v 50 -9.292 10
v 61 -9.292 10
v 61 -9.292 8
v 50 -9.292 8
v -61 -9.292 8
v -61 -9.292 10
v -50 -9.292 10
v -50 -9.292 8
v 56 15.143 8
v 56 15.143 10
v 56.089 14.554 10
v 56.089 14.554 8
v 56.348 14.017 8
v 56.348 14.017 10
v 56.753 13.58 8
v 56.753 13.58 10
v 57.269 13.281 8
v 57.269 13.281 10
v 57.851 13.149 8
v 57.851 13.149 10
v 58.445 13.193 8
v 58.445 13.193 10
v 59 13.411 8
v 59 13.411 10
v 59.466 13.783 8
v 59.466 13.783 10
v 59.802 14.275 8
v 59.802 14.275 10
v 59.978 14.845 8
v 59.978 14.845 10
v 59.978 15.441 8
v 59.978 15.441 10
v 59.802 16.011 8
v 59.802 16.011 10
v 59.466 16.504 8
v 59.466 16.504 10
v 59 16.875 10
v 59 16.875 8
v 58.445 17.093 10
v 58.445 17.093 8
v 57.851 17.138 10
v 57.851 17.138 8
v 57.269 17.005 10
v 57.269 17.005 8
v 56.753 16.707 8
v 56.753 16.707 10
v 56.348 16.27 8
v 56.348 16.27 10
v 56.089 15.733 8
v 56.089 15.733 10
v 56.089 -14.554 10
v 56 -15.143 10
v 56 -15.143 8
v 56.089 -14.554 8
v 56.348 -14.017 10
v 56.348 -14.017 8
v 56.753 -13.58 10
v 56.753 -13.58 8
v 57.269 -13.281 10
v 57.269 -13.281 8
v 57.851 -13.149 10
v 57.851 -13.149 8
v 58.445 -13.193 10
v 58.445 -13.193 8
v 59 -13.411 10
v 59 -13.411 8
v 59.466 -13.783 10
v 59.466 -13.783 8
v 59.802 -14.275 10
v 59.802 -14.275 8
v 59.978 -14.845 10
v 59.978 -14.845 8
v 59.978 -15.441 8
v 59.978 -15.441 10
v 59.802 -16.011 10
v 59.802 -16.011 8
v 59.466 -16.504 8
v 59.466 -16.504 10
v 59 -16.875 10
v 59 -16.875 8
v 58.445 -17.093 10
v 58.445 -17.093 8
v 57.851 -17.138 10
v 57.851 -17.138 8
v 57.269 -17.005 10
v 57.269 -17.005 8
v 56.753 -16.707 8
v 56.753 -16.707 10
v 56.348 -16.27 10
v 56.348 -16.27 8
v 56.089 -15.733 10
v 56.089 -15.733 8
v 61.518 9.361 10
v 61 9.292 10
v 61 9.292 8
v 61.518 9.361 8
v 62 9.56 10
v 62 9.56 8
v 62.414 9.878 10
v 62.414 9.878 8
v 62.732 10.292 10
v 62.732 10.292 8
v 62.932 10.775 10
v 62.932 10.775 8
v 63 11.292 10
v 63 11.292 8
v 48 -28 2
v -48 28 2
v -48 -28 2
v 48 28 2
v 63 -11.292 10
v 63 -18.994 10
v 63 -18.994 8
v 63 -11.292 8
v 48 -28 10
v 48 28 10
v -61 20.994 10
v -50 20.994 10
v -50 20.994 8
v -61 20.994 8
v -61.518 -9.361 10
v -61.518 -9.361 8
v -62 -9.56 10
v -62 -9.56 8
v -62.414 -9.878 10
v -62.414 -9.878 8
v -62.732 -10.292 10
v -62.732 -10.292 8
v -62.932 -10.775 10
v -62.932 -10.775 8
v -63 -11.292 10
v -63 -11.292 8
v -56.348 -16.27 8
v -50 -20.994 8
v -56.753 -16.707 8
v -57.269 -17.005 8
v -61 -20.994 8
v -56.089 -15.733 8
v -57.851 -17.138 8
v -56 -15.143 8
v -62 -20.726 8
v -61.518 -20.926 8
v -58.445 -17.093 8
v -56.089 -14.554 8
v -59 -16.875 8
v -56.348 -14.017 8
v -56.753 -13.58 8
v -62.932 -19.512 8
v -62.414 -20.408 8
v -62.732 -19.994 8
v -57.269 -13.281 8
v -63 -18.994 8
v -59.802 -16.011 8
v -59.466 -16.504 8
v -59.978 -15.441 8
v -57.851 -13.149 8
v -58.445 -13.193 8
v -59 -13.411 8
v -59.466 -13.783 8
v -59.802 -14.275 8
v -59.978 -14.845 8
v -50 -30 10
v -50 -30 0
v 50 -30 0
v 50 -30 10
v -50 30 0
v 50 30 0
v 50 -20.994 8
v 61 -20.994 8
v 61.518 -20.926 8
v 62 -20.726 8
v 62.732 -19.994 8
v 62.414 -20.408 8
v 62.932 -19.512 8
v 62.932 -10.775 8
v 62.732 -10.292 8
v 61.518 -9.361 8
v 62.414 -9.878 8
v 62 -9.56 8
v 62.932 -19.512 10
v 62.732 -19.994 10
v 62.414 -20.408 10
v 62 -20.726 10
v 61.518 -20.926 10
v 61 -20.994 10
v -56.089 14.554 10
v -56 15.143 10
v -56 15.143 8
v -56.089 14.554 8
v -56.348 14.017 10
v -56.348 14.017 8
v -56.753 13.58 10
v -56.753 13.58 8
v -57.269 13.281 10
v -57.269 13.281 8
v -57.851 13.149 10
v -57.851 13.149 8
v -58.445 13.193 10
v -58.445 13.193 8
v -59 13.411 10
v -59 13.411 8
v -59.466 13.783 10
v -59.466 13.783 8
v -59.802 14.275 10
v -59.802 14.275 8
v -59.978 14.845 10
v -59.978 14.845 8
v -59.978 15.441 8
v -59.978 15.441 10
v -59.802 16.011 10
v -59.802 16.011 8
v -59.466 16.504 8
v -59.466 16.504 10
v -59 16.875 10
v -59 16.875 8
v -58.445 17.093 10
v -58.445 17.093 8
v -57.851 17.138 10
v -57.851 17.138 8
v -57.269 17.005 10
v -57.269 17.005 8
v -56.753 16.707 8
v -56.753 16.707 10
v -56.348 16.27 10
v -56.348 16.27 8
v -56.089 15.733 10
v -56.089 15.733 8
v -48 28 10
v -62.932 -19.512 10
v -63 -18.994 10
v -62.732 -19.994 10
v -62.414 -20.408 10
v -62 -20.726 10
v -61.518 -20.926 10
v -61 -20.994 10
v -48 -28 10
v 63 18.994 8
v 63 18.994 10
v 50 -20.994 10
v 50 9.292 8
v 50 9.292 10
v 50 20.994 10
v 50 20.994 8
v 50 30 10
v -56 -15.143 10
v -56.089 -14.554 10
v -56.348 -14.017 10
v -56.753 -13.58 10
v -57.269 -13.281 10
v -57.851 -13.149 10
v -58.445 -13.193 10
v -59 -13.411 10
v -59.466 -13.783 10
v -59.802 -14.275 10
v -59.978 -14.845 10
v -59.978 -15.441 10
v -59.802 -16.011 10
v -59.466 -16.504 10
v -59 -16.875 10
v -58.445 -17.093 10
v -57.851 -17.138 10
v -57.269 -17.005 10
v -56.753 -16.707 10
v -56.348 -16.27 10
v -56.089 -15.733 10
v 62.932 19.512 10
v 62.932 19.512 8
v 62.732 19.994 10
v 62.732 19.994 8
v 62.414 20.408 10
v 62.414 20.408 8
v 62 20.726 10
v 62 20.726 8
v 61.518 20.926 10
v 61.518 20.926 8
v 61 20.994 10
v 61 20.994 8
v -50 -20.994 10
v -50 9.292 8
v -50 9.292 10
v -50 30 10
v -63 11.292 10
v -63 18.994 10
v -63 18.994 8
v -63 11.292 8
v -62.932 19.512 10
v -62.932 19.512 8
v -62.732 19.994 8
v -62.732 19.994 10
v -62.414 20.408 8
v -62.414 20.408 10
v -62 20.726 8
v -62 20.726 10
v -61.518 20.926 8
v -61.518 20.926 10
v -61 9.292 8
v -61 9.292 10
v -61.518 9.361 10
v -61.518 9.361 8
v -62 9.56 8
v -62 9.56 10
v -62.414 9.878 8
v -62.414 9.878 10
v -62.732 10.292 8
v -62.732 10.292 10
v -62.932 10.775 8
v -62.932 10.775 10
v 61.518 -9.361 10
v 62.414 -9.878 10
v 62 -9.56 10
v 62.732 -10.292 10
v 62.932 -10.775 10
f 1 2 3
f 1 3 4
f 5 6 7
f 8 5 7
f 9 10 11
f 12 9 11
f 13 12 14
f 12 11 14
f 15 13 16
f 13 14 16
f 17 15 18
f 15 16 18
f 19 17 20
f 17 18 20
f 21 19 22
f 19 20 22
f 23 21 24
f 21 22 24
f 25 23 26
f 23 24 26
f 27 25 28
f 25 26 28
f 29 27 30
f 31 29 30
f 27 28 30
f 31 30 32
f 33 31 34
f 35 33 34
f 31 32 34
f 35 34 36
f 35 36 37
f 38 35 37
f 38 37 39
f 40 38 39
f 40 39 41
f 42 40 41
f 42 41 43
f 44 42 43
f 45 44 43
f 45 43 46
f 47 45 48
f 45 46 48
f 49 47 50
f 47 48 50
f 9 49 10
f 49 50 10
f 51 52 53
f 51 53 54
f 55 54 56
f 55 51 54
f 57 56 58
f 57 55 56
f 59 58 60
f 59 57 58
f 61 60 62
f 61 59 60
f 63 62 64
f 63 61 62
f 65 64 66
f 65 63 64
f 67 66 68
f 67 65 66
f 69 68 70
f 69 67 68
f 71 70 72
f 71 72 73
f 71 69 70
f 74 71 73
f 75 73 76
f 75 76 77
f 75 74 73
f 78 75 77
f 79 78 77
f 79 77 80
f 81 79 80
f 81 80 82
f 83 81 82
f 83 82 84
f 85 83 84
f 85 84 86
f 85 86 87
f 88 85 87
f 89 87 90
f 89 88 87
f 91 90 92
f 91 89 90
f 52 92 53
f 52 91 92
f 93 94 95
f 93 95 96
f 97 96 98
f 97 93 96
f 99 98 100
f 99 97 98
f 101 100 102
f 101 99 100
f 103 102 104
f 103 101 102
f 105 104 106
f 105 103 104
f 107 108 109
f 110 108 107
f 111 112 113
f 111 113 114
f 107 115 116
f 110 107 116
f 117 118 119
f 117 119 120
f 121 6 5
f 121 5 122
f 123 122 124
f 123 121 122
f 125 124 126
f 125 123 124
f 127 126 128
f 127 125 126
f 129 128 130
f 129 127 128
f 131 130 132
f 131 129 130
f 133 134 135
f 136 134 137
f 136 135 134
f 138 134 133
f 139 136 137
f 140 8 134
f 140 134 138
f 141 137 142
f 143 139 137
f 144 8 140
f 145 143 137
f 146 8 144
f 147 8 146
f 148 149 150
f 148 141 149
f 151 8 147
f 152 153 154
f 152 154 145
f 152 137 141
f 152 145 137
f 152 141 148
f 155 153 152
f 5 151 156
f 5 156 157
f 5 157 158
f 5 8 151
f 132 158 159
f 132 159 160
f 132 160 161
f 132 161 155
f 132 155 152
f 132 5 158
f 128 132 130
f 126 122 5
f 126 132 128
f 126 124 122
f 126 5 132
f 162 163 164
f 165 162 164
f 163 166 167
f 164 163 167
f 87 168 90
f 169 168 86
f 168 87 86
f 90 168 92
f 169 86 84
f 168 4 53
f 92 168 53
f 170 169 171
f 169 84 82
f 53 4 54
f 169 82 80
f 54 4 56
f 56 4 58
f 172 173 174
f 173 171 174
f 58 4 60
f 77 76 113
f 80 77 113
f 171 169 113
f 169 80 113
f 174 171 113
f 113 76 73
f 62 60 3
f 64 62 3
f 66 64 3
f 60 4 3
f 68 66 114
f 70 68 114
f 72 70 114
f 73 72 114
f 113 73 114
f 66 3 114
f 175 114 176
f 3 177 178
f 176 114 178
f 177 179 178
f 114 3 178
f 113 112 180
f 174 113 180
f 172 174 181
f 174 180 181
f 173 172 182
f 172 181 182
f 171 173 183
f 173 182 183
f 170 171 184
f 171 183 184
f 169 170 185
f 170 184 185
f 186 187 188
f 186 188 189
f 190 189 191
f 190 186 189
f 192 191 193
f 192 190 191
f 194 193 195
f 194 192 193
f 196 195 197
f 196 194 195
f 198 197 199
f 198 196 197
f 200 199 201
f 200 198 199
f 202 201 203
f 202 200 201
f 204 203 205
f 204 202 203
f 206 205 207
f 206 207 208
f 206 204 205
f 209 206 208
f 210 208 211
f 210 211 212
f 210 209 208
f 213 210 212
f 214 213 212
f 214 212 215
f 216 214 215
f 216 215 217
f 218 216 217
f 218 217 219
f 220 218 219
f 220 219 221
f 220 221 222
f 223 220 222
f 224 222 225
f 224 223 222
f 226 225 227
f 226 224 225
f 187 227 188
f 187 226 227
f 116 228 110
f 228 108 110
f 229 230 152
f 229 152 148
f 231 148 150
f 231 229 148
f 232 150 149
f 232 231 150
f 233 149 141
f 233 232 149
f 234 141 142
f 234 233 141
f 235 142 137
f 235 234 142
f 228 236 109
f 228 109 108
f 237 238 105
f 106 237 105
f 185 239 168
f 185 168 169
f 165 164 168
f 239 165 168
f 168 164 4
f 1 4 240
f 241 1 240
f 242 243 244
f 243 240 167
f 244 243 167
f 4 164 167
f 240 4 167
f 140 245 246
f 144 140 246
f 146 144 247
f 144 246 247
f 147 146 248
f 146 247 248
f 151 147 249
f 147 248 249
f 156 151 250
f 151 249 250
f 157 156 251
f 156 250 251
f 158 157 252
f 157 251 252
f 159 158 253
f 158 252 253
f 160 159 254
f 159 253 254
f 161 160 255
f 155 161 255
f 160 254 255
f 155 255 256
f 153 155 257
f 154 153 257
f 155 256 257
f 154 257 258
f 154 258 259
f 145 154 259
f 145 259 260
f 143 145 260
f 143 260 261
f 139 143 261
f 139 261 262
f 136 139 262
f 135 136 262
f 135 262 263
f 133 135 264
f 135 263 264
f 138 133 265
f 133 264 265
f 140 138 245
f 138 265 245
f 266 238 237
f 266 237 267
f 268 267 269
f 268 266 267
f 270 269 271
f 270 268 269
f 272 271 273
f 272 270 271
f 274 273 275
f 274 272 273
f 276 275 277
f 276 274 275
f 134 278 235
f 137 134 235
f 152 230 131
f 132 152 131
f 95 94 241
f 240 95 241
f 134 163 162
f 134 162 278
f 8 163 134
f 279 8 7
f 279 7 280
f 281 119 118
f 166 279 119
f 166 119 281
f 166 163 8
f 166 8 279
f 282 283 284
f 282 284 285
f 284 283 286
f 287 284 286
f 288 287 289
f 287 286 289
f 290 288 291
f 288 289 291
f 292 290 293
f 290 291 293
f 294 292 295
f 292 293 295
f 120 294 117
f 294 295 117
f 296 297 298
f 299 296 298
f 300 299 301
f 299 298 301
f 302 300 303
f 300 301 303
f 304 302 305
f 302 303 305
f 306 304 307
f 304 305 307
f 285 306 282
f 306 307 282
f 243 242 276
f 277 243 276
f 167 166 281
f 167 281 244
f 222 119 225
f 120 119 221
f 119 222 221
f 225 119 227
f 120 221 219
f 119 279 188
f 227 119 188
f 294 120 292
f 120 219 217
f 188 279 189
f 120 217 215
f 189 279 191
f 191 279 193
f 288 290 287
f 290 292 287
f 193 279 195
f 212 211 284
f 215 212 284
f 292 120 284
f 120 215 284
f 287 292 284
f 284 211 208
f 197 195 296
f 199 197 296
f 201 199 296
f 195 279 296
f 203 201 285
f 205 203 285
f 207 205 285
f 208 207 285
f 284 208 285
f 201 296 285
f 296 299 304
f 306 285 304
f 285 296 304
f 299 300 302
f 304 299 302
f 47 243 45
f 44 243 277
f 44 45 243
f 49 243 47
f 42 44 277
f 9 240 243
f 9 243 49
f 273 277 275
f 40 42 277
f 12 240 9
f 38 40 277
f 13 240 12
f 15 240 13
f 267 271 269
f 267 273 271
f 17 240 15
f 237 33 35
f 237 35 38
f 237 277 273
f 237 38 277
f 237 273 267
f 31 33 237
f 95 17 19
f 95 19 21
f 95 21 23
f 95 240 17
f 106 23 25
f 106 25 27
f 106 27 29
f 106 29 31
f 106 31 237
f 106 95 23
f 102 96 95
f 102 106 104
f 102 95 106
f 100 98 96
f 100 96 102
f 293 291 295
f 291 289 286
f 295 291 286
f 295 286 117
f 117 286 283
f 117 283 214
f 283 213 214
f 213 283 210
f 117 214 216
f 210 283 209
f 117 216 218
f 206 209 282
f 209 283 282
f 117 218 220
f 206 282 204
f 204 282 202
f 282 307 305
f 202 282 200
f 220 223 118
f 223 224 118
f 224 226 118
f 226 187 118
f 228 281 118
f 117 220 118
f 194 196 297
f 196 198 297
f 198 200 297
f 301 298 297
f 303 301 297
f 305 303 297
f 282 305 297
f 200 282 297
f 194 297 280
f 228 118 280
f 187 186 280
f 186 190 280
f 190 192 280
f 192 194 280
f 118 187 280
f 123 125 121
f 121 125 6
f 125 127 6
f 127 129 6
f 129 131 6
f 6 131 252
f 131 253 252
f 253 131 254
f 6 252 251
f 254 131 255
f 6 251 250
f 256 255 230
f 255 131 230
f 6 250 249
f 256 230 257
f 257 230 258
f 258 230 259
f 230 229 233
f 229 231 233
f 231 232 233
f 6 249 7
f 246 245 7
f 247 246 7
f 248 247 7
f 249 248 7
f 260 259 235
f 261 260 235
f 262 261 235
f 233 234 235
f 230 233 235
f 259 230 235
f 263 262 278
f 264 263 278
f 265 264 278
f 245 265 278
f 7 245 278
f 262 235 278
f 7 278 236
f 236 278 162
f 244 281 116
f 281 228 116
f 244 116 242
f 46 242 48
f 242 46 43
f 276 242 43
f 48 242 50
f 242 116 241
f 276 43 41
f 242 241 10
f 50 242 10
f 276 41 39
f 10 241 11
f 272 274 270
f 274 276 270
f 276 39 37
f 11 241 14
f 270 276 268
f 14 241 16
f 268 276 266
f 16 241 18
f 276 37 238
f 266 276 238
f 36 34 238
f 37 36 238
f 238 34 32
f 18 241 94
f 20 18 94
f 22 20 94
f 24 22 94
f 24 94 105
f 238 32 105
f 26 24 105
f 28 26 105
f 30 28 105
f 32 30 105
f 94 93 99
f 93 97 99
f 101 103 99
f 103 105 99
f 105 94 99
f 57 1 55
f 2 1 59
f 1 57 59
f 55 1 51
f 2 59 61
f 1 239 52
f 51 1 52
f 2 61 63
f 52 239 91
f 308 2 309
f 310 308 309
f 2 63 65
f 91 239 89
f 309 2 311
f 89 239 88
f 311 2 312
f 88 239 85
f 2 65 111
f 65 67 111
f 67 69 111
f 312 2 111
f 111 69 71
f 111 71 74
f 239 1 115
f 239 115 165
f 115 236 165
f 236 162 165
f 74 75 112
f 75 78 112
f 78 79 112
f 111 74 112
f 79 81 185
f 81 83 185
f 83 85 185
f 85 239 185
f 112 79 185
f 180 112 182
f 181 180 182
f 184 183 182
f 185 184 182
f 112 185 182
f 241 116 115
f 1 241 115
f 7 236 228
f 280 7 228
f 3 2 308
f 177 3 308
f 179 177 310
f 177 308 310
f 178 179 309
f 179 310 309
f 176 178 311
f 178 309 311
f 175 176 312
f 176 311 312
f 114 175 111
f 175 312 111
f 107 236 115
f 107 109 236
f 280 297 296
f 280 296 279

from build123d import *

# Parameters (mm, degrees)
SKETCH_W                = 100
SKETCH_H                = 60
PAD_DEPTH               = 10
THICKNESS_T             = -2
SKETCH001_R             = 2
PAD001_DEPTH            = 2
SKETCH001_MIRRORED_2_R  = 2
PAD001_MIRRORED_2_DEPTH = 2


with BuildPart() as part:
    # Sketch → Pad (new body)
    with BuildSketch(Plane.XY):
        Rectangle(SKETCH_W, SKETCH_H)
    extrude(amount=PAD_DEPTH)

    # Thickness
    thickness_openings = [part.faces().sort_by_distance(p)[0] for p in [
        (0, 0, 10),
    ]]
    offset(amount=THICKNESS_T, openings=thickness_openings)

    # Sketch001 (on Face6 of Thickness) → Pad001 (join)
    with BuildSketch(Plane.XY.offset(10)):
        with BuildLine():
            Line((-61, -9.292408), (-48, -9.292408))
            Line((-48, -9.292408), (-48, -20.993994))
            Line((-48, -20.993994), (-61, -20.993994))
            ThreePointArc((-63, -18.993994), (-62.414214, -20.408207), (-61, -20.993994))
            Line((-63, -18.993994), (-63, -11.292408))
            ThreePointArc((-61, -9.292408), (-62.414214, -9.878194), (-63, -11.292408))
        make_face()
        with Locations((-58, -15.143201)):
            Circle(SKETCH001_R, mode=Mode.SUBTRACT)
    pad001 = extrude(amount=-PAD001_DEPTH)

    # Sketch001 Mirrored 2 → Pad001 Mirrored 2 (add)
    with BuildSketch(Plane(origin=(0, 0, 10), x_dir=(-1, 0, 0), z_dir=(0, 0, -1))):
        with BuildLine():
            Line((-61, -9.292408), (-48, -9.292408))
            Line((-48, -9.292408), (-48, -20.993994))
            Line((-48, -20.993994), (-61, -20.993994))
            ThreePointArc((-63, -18.993994), (-62.414214, -20.408207), (-61, -20.993994))
            Line((-63, -18.993994), (-63, -11.292408))
            ThreePointArc((-61, -9.292408), (-62.414214, -9.878194), (-63, -11.292408))
        make_face()
        with Locations((-58, -15.143201)):
            Circle(SKETCH001_MIRRORED_2_R, mode=Mode.SUBTRACT)
    pad001_mirrored_2 = extrude(amount=PAD001_MIRRORED_2_DEPTH)

    # Mirrored001: Pad001, Pad001 Mirrored 2 across XZ
    add(pad001.mirror(Plane.XZ))
    add(pad001_mirrored_2.mirror(Plane.XZ))


solid = part.part
